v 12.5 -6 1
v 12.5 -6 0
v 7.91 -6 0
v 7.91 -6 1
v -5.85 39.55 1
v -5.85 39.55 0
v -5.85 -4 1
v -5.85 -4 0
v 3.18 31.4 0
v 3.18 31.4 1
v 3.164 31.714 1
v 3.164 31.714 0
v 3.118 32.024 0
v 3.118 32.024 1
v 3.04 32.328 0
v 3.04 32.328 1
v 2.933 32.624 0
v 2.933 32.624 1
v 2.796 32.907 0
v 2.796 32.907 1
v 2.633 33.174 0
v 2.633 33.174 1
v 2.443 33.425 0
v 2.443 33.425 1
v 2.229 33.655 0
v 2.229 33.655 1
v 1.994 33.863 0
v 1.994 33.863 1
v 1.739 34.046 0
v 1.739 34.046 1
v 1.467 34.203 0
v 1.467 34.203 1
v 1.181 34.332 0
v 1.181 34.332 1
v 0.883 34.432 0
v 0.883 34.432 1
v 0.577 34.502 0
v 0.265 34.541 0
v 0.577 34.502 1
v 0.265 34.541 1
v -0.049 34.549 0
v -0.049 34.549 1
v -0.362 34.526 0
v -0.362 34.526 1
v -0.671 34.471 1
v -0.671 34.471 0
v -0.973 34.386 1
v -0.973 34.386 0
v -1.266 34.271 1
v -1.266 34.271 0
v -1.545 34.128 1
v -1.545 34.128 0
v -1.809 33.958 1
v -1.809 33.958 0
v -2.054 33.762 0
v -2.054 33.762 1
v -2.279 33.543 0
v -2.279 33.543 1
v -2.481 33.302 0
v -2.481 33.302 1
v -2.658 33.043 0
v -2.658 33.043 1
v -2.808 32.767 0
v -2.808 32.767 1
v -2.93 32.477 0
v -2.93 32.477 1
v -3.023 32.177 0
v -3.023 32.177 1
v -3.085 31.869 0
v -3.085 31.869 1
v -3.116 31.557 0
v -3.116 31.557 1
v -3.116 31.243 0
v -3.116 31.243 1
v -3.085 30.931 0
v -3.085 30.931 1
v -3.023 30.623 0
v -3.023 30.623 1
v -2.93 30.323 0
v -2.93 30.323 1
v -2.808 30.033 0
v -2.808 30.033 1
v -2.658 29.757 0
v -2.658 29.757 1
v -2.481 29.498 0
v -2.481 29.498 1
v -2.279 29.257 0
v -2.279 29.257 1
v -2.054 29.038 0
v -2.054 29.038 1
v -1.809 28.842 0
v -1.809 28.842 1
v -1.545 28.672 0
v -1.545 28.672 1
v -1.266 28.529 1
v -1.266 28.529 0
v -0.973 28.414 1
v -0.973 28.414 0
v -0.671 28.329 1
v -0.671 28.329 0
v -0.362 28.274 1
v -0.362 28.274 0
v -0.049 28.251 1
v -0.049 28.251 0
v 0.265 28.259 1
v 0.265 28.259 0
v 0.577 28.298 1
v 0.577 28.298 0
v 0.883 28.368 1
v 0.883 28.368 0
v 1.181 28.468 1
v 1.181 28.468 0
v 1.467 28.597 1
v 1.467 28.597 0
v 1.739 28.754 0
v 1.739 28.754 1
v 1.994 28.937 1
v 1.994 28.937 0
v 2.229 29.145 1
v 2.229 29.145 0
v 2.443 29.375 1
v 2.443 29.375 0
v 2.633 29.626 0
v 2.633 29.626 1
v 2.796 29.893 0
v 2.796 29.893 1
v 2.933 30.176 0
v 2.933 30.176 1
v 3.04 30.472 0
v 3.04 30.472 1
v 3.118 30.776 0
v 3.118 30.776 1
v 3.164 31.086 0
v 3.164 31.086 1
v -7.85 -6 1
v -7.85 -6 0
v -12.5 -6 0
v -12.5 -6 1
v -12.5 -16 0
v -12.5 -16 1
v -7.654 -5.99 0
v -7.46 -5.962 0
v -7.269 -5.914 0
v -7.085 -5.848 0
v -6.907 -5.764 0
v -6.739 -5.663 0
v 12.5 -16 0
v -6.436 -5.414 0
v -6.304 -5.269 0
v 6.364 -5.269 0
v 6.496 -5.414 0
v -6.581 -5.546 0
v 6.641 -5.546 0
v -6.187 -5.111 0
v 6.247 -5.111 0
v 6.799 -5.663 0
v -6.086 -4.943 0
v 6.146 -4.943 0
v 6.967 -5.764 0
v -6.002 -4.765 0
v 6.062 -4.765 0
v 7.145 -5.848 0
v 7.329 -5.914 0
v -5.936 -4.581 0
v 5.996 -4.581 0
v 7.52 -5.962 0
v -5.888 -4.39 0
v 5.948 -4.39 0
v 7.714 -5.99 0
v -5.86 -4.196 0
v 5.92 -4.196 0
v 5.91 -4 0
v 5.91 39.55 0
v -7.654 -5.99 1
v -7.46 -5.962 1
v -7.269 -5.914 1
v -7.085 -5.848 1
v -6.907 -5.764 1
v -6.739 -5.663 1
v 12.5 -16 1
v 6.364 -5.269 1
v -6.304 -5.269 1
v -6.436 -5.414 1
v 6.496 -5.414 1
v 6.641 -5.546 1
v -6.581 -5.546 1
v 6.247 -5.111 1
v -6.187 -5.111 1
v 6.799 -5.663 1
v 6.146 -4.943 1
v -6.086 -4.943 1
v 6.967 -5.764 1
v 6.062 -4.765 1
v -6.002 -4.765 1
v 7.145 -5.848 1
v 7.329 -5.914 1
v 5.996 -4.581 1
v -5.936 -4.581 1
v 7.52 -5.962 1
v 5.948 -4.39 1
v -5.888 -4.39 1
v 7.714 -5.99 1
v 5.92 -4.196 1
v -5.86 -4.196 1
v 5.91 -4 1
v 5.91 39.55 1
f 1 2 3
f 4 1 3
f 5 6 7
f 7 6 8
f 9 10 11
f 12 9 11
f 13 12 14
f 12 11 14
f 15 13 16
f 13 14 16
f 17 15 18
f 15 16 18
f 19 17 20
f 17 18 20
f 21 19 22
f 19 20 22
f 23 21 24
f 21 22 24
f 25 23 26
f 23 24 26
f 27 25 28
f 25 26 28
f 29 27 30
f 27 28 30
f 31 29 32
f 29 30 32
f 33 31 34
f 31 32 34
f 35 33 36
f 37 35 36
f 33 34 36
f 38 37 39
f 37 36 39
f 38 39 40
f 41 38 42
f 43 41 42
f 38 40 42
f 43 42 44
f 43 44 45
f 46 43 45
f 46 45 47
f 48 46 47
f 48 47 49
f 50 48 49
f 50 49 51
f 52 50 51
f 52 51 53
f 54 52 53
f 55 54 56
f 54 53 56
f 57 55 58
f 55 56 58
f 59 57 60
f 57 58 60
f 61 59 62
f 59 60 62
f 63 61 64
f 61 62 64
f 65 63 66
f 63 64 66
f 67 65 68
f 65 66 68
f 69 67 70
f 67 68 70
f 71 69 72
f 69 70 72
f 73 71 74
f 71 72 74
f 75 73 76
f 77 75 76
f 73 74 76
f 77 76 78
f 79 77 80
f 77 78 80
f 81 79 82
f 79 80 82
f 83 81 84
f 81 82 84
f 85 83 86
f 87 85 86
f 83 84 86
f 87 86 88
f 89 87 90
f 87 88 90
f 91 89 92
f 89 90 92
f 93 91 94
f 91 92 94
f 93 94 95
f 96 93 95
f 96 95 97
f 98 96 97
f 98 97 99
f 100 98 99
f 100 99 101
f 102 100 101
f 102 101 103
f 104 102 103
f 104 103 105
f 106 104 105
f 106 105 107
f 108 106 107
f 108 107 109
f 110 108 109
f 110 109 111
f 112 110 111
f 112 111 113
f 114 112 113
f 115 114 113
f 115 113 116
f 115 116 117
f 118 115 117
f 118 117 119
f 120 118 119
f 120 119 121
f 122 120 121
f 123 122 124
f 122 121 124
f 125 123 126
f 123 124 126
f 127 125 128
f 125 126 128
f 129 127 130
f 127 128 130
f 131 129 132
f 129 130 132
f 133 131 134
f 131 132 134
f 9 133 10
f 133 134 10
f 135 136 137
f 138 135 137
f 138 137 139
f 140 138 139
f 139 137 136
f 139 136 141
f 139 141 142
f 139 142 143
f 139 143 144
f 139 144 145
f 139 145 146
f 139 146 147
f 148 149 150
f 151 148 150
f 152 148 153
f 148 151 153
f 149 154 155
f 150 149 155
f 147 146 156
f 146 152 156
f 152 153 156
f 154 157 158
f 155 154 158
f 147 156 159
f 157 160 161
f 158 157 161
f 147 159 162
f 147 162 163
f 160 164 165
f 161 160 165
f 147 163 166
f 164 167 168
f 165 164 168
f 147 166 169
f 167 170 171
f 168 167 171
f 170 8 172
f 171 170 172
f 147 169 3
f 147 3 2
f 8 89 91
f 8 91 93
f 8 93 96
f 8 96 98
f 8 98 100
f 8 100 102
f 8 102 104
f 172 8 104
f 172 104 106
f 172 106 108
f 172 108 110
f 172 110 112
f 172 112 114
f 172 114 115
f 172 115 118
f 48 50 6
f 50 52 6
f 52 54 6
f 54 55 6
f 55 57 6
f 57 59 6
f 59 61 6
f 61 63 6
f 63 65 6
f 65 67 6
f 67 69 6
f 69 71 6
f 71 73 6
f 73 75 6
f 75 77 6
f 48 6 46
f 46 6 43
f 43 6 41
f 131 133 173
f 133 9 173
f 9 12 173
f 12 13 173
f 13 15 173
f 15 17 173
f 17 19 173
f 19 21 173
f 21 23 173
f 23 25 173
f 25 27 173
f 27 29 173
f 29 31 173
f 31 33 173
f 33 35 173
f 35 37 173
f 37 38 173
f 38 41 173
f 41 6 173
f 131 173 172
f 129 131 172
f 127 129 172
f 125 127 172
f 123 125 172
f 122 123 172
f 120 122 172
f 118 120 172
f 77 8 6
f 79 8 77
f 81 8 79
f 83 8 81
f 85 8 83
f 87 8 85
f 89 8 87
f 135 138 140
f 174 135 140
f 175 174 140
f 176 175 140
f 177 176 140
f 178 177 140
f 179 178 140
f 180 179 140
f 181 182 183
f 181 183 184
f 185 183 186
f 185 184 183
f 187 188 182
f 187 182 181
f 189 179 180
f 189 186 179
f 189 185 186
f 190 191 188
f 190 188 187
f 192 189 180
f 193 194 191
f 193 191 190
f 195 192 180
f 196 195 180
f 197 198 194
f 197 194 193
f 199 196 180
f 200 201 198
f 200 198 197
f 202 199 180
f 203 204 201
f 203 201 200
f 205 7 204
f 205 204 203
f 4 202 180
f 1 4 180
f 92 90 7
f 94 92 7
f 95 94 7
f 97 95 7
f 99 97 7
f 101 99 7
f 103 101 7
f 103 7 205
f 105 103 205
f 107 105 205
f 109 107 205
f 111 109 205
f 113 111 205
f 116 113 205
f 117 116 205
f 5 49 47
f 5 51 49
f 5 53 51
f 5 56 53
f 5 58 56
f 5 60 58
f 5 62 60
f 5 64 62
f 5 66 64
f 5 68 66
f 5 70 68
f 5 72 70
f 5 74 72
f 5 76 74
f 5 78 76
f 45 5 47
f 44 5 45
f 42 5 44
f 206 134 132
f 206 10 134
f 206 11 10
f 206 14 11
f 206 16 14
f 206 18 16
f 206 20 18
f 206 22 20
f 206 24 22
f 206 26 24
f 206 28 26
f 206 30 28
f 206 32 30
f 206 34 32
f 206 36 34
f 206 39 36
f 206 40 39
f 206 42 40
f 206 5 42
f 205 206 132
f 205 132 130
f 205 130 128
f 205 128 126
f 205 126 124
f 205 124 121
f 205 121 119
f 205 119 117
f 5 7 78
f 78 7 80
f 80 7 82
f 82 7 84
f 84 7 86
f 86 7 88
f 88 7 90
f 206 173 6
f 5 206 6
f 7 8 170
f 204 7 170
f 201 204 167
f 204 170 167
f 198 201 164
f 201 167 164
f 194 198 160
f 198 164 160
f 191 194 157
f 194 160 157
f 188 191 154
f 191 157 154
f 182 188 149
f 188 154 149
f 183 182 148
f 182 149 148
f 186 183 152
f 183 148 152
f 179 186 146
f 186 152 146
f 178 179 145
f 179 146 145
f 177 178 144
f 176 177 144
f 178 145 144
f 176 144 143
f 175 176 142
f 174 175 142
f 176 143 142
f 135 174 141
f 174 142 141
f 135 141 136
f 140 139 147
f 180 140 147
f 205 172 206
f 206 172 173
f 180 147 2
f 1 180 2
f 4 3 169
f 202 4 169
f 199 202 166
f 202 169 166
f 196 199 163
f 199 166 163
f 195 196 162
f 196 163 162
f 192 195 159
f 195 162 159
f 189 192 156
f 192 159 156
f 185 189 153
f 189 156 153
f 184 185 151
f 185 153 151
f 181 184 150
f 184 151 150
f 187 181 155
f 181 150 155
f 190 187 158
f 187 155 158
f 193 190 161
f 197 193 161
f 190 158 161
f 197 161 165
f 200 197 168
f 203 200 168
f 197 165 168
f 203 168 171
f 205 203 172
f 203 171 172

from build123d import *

# Parameters (mm, degrees)
DODANIE_WYCI_GNI_CIE1_DEPTH = 1
SZKIC2_R                    = 3.15
WYTNIJ_WYCI_GNI_CIE1_DEPTH  = 1


with BuildPart() as part:
    # Szkic1 → Dodanie-wyciągnięcie1 (new body)
    with BuildSketch(Plane.XY):
        with BuildLine():
            Line((-12.5, -6), (-12.5, -16))
            Line((-12.5, -16), (12.5, -16))
            Line((12.5, -16), (12.5, -6))
            Line((12.5, -6), (7.91, -6))
            ThreePointArc((7.91, -6), (6.495786438, -5.414213562), (5.91, -4))
            Line((5.91, -4), (5.91, 5.45))
            Line((5.91, 5.45), (5.91, 39.55))
            Line((5.91, 39.55), (-5.85, 39.55))
            Line((-5.85, 39.55), (-5.85, 5.45))
            Line((-5.85, 5.45), (-5.85, -4))
            ThreePointArc((-5.85, -4), (-6.435786438, -5.414213562), (-7.85, -6))
            Line((-7.85, -6), (-12.5, -6))
        make_face()
    extrude(amount=DODANIE_WYCI_GNI_CIE1_DEPTH)

    # Szkic2 → Wytnij-wyciągnięcie1 (cut)
    with BuildSketch(Plane.XY.offset(1)):
        with Locations((0.03, 31.4)):
            Circle(SZKIC2_R)
    extrude(amount=-WYTNIJ_WYCI_GNI_CIE1_DEPTH, mode=Mode.SUBTRACT)


solid = part.part
